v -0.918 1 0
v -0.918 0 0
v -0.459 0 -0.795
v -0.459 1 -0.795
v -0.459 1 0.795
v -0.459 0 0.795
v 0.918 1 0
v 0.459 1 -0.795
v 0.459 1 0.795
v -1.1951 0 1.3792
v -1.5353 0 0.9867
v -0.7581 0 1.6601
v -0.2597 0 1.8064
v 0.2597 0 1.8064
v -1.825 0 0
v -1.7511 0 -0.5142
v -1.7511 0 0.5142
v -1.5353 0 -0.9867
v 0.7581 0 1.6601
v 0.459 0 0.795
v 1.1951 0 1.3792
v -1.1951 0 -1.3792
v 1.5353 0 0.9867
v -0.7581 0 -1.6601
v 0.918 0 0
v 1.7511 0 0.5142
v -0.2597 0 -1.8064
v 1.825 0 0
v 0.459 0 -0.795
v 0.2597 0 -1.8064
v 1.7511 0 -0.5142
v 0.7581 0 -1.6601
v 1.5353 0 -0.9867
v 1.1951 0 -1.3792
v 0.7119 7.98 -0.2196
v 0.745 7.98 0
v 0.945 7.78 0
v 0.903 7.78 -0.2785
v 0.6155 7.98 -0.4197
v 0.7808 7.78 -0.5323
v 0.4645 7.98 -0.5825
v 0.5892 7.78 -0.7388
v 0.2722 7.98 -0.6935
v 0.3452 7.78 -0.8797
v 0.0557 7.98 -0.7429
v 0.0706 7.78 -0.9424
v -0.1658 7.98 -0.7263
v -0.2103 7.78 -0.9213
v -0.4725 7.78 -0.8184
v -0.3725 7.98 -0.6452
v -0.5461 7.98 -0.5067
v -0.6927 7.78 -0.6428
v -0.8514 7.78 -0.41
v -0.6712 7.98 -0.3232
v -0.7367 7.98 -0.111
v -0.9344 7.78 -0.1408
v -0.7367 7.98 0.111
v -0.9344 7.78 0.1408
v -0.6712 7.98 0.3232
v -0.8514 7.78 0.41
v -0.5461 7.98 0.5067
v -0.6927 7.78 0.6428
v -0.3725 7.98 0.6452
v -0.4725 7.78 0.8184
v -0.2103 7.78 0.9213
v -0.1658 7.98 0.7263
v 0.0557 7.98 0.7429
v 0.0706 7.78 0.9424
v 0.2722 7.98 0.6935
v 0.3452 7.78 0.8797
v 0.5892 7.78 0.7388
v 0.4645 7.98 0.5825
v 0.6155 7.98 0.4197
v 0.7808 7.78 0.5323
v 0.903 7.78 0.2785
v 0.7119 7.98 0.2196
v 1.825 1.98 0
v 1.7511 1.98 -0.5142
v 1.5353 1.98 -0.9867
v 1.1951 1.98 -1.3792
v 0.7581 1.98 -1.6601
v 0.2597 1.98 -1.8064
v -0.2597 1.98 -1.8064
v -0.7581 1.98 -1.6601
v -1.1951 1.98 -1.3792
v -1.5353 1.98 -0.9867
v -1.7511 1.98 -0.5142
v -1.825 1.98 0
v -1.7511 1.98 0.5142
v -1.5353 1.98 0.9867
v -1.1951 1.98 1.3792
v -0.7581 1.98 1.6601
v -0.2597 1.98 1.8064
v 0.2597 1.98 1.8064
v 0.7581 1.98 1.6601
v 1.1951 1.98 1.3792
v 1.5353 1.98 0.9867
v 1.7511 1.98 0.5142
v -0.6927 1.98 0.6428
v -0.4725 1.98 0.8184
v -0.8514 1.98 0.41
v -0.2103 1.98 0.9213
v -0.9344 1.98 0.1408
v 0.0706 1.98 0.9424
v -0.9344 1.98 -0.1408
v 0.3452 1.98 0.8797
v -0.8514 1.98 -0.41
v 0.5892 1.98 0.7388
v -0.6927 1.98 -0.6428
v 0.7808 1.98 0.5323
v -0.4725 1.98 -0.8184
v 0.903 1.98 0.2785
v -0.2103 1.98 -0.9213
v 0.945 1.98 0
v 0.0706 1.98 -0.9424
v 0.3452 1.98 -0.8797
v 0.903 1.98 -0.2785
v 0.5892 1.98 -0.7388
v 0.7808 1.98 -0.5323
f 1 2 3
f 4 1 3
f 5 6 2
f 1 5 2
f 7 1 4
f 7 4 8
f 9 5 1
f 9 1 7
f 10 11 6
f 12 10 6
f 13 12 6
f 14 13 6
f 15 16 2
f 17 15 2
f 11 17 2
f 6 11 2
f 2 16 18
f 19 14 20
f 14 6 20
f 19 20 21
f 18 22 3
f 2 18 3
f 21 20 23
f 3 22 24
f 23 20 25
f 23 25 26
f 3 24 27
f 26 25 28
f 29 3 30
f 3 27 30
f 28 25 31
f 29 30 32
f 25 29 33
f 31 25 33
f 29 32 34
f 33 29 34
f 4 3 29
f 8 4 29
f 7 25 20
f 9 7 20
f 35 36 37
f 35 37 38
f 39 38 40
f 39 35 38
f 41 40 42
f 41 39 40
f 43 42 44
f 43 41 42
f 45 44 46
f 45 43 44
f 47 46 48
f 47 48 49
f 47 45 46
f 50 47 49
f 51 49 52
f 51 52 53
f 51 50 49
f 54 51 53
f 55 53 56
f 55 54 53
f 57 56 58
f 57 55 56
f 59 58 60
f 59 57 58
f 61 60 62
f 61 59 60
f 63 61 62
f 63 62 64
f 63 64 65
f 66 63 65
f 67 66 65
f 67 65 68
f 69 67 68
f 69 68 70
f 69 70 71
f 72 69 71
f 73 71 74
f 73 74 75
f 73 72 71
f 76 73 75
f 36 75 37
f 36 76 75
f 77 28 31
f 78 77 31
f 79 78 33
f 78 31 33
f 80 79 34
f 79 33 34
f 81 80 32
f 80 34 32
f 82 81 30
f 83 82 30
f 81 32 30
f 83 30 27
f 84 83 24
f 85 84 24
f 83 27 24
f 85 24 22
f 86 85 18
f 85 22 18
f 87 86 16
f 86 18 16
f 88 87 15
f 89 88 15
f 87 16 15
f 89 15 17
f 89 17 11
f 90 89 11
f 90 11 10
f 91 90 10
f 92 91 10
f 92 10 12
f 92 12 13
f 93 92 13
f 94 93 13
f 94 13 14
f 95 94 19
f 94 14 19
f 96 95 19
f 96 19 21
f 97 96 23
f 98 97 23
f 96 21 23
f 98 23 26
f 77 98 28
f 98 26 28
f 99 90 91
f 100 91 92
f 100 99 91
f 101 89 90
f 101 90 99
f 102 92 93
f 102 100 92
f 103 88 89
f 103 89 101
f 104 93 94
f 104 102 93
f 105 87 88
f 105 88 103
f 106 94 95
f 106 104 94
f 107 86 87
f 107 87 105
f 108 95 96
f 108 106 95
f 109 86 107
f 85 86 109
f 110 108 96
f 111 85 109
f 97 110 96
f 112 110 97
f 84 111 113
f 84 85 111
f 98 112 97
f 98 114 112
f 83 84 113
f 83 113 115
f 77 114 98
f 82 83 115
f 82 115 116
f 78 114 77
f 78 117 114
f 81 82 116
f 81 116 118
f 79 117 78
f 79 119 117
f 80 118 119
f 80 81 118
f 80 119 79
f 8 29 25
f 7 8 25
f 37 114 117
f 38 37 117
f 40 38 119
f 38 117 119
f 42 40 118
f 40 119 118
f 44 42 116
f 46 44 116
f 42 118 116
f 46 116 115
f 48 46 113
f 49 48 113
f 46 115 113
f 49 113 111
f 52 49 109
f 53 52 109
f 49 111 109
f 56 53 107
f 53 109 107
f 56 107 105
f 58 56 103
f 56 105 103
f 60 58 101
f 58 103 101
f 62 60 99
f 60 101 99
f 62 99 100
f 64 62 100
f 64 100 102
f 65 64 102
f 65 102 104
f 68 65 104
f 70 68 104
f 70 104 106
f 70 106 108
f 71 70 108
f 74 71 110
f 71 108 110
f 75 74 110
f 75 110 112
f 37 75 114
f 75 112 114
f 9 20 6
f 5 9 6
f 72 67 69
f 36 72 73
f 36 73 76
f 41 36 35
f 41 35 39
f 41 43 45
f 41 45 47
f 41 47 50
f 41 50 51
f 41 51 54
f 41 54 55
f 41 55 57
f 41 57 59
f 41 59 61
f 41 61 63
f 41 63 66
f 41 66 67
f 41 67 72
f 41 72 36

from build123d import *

# Parameters (mm, degrees)
SKETCH1_R           = 1.825
BOSS_EXTRUDE1_DEPTH = 1.98
SKETCH2_R           = 0.945
BOSS_EXTRUDE2_DEPTH = 6
CUT_EXTRUDE1_DEPTH  = 1
CHAMFER1_SIZE       = 0.2


with BuildPart() as part:
    # Sketch1 → Boss-Extrude1 (new body)
    with BuildSketch(Plane(origin=(0, 0, 0), x_dir=(1, 0, 0), z_dir=(0, 1, 0))):
        Circle(SKETCH1_R)
    extrude(amount=BOSS_EXTRUDE1_DEPTH)

    # Sketch2 → Boss-Extrude2 (add)
    with BuildSketch(Plane(origin=(0, 1.98, 0), x_dir=(1, 0, 0), z_dir=(0, 1, 0))):
        Circle(SKETCH2_R)
    extrude(amount=BOSS_EXTRUDE2_DEPTH)

    # Sketch3 → Cut-Extrude1 (cut)
    with BuildSketch(Plane.XZ):
        Polygon((0.458993464, -0.795), (0.917986928, 0), (0.458993464, 0.795), (-0.458993464, 0.795), (-0.917986928, 0), (-0.458993464, -0.795), align=None)
    extrude(amount=-CUT_EXTRUDE1_DEPTH, mode=Mode.SUBTRACT)

    # Chamfer1
    chamfer1_edges = [part.edges().sort_by_distance(p)[0] for p in [
        (-0.945, 7.98, 0),
    ]]
    chamfer(chamfer1_edges, length=CHAMFER1_SIZE)


solid = part.part
